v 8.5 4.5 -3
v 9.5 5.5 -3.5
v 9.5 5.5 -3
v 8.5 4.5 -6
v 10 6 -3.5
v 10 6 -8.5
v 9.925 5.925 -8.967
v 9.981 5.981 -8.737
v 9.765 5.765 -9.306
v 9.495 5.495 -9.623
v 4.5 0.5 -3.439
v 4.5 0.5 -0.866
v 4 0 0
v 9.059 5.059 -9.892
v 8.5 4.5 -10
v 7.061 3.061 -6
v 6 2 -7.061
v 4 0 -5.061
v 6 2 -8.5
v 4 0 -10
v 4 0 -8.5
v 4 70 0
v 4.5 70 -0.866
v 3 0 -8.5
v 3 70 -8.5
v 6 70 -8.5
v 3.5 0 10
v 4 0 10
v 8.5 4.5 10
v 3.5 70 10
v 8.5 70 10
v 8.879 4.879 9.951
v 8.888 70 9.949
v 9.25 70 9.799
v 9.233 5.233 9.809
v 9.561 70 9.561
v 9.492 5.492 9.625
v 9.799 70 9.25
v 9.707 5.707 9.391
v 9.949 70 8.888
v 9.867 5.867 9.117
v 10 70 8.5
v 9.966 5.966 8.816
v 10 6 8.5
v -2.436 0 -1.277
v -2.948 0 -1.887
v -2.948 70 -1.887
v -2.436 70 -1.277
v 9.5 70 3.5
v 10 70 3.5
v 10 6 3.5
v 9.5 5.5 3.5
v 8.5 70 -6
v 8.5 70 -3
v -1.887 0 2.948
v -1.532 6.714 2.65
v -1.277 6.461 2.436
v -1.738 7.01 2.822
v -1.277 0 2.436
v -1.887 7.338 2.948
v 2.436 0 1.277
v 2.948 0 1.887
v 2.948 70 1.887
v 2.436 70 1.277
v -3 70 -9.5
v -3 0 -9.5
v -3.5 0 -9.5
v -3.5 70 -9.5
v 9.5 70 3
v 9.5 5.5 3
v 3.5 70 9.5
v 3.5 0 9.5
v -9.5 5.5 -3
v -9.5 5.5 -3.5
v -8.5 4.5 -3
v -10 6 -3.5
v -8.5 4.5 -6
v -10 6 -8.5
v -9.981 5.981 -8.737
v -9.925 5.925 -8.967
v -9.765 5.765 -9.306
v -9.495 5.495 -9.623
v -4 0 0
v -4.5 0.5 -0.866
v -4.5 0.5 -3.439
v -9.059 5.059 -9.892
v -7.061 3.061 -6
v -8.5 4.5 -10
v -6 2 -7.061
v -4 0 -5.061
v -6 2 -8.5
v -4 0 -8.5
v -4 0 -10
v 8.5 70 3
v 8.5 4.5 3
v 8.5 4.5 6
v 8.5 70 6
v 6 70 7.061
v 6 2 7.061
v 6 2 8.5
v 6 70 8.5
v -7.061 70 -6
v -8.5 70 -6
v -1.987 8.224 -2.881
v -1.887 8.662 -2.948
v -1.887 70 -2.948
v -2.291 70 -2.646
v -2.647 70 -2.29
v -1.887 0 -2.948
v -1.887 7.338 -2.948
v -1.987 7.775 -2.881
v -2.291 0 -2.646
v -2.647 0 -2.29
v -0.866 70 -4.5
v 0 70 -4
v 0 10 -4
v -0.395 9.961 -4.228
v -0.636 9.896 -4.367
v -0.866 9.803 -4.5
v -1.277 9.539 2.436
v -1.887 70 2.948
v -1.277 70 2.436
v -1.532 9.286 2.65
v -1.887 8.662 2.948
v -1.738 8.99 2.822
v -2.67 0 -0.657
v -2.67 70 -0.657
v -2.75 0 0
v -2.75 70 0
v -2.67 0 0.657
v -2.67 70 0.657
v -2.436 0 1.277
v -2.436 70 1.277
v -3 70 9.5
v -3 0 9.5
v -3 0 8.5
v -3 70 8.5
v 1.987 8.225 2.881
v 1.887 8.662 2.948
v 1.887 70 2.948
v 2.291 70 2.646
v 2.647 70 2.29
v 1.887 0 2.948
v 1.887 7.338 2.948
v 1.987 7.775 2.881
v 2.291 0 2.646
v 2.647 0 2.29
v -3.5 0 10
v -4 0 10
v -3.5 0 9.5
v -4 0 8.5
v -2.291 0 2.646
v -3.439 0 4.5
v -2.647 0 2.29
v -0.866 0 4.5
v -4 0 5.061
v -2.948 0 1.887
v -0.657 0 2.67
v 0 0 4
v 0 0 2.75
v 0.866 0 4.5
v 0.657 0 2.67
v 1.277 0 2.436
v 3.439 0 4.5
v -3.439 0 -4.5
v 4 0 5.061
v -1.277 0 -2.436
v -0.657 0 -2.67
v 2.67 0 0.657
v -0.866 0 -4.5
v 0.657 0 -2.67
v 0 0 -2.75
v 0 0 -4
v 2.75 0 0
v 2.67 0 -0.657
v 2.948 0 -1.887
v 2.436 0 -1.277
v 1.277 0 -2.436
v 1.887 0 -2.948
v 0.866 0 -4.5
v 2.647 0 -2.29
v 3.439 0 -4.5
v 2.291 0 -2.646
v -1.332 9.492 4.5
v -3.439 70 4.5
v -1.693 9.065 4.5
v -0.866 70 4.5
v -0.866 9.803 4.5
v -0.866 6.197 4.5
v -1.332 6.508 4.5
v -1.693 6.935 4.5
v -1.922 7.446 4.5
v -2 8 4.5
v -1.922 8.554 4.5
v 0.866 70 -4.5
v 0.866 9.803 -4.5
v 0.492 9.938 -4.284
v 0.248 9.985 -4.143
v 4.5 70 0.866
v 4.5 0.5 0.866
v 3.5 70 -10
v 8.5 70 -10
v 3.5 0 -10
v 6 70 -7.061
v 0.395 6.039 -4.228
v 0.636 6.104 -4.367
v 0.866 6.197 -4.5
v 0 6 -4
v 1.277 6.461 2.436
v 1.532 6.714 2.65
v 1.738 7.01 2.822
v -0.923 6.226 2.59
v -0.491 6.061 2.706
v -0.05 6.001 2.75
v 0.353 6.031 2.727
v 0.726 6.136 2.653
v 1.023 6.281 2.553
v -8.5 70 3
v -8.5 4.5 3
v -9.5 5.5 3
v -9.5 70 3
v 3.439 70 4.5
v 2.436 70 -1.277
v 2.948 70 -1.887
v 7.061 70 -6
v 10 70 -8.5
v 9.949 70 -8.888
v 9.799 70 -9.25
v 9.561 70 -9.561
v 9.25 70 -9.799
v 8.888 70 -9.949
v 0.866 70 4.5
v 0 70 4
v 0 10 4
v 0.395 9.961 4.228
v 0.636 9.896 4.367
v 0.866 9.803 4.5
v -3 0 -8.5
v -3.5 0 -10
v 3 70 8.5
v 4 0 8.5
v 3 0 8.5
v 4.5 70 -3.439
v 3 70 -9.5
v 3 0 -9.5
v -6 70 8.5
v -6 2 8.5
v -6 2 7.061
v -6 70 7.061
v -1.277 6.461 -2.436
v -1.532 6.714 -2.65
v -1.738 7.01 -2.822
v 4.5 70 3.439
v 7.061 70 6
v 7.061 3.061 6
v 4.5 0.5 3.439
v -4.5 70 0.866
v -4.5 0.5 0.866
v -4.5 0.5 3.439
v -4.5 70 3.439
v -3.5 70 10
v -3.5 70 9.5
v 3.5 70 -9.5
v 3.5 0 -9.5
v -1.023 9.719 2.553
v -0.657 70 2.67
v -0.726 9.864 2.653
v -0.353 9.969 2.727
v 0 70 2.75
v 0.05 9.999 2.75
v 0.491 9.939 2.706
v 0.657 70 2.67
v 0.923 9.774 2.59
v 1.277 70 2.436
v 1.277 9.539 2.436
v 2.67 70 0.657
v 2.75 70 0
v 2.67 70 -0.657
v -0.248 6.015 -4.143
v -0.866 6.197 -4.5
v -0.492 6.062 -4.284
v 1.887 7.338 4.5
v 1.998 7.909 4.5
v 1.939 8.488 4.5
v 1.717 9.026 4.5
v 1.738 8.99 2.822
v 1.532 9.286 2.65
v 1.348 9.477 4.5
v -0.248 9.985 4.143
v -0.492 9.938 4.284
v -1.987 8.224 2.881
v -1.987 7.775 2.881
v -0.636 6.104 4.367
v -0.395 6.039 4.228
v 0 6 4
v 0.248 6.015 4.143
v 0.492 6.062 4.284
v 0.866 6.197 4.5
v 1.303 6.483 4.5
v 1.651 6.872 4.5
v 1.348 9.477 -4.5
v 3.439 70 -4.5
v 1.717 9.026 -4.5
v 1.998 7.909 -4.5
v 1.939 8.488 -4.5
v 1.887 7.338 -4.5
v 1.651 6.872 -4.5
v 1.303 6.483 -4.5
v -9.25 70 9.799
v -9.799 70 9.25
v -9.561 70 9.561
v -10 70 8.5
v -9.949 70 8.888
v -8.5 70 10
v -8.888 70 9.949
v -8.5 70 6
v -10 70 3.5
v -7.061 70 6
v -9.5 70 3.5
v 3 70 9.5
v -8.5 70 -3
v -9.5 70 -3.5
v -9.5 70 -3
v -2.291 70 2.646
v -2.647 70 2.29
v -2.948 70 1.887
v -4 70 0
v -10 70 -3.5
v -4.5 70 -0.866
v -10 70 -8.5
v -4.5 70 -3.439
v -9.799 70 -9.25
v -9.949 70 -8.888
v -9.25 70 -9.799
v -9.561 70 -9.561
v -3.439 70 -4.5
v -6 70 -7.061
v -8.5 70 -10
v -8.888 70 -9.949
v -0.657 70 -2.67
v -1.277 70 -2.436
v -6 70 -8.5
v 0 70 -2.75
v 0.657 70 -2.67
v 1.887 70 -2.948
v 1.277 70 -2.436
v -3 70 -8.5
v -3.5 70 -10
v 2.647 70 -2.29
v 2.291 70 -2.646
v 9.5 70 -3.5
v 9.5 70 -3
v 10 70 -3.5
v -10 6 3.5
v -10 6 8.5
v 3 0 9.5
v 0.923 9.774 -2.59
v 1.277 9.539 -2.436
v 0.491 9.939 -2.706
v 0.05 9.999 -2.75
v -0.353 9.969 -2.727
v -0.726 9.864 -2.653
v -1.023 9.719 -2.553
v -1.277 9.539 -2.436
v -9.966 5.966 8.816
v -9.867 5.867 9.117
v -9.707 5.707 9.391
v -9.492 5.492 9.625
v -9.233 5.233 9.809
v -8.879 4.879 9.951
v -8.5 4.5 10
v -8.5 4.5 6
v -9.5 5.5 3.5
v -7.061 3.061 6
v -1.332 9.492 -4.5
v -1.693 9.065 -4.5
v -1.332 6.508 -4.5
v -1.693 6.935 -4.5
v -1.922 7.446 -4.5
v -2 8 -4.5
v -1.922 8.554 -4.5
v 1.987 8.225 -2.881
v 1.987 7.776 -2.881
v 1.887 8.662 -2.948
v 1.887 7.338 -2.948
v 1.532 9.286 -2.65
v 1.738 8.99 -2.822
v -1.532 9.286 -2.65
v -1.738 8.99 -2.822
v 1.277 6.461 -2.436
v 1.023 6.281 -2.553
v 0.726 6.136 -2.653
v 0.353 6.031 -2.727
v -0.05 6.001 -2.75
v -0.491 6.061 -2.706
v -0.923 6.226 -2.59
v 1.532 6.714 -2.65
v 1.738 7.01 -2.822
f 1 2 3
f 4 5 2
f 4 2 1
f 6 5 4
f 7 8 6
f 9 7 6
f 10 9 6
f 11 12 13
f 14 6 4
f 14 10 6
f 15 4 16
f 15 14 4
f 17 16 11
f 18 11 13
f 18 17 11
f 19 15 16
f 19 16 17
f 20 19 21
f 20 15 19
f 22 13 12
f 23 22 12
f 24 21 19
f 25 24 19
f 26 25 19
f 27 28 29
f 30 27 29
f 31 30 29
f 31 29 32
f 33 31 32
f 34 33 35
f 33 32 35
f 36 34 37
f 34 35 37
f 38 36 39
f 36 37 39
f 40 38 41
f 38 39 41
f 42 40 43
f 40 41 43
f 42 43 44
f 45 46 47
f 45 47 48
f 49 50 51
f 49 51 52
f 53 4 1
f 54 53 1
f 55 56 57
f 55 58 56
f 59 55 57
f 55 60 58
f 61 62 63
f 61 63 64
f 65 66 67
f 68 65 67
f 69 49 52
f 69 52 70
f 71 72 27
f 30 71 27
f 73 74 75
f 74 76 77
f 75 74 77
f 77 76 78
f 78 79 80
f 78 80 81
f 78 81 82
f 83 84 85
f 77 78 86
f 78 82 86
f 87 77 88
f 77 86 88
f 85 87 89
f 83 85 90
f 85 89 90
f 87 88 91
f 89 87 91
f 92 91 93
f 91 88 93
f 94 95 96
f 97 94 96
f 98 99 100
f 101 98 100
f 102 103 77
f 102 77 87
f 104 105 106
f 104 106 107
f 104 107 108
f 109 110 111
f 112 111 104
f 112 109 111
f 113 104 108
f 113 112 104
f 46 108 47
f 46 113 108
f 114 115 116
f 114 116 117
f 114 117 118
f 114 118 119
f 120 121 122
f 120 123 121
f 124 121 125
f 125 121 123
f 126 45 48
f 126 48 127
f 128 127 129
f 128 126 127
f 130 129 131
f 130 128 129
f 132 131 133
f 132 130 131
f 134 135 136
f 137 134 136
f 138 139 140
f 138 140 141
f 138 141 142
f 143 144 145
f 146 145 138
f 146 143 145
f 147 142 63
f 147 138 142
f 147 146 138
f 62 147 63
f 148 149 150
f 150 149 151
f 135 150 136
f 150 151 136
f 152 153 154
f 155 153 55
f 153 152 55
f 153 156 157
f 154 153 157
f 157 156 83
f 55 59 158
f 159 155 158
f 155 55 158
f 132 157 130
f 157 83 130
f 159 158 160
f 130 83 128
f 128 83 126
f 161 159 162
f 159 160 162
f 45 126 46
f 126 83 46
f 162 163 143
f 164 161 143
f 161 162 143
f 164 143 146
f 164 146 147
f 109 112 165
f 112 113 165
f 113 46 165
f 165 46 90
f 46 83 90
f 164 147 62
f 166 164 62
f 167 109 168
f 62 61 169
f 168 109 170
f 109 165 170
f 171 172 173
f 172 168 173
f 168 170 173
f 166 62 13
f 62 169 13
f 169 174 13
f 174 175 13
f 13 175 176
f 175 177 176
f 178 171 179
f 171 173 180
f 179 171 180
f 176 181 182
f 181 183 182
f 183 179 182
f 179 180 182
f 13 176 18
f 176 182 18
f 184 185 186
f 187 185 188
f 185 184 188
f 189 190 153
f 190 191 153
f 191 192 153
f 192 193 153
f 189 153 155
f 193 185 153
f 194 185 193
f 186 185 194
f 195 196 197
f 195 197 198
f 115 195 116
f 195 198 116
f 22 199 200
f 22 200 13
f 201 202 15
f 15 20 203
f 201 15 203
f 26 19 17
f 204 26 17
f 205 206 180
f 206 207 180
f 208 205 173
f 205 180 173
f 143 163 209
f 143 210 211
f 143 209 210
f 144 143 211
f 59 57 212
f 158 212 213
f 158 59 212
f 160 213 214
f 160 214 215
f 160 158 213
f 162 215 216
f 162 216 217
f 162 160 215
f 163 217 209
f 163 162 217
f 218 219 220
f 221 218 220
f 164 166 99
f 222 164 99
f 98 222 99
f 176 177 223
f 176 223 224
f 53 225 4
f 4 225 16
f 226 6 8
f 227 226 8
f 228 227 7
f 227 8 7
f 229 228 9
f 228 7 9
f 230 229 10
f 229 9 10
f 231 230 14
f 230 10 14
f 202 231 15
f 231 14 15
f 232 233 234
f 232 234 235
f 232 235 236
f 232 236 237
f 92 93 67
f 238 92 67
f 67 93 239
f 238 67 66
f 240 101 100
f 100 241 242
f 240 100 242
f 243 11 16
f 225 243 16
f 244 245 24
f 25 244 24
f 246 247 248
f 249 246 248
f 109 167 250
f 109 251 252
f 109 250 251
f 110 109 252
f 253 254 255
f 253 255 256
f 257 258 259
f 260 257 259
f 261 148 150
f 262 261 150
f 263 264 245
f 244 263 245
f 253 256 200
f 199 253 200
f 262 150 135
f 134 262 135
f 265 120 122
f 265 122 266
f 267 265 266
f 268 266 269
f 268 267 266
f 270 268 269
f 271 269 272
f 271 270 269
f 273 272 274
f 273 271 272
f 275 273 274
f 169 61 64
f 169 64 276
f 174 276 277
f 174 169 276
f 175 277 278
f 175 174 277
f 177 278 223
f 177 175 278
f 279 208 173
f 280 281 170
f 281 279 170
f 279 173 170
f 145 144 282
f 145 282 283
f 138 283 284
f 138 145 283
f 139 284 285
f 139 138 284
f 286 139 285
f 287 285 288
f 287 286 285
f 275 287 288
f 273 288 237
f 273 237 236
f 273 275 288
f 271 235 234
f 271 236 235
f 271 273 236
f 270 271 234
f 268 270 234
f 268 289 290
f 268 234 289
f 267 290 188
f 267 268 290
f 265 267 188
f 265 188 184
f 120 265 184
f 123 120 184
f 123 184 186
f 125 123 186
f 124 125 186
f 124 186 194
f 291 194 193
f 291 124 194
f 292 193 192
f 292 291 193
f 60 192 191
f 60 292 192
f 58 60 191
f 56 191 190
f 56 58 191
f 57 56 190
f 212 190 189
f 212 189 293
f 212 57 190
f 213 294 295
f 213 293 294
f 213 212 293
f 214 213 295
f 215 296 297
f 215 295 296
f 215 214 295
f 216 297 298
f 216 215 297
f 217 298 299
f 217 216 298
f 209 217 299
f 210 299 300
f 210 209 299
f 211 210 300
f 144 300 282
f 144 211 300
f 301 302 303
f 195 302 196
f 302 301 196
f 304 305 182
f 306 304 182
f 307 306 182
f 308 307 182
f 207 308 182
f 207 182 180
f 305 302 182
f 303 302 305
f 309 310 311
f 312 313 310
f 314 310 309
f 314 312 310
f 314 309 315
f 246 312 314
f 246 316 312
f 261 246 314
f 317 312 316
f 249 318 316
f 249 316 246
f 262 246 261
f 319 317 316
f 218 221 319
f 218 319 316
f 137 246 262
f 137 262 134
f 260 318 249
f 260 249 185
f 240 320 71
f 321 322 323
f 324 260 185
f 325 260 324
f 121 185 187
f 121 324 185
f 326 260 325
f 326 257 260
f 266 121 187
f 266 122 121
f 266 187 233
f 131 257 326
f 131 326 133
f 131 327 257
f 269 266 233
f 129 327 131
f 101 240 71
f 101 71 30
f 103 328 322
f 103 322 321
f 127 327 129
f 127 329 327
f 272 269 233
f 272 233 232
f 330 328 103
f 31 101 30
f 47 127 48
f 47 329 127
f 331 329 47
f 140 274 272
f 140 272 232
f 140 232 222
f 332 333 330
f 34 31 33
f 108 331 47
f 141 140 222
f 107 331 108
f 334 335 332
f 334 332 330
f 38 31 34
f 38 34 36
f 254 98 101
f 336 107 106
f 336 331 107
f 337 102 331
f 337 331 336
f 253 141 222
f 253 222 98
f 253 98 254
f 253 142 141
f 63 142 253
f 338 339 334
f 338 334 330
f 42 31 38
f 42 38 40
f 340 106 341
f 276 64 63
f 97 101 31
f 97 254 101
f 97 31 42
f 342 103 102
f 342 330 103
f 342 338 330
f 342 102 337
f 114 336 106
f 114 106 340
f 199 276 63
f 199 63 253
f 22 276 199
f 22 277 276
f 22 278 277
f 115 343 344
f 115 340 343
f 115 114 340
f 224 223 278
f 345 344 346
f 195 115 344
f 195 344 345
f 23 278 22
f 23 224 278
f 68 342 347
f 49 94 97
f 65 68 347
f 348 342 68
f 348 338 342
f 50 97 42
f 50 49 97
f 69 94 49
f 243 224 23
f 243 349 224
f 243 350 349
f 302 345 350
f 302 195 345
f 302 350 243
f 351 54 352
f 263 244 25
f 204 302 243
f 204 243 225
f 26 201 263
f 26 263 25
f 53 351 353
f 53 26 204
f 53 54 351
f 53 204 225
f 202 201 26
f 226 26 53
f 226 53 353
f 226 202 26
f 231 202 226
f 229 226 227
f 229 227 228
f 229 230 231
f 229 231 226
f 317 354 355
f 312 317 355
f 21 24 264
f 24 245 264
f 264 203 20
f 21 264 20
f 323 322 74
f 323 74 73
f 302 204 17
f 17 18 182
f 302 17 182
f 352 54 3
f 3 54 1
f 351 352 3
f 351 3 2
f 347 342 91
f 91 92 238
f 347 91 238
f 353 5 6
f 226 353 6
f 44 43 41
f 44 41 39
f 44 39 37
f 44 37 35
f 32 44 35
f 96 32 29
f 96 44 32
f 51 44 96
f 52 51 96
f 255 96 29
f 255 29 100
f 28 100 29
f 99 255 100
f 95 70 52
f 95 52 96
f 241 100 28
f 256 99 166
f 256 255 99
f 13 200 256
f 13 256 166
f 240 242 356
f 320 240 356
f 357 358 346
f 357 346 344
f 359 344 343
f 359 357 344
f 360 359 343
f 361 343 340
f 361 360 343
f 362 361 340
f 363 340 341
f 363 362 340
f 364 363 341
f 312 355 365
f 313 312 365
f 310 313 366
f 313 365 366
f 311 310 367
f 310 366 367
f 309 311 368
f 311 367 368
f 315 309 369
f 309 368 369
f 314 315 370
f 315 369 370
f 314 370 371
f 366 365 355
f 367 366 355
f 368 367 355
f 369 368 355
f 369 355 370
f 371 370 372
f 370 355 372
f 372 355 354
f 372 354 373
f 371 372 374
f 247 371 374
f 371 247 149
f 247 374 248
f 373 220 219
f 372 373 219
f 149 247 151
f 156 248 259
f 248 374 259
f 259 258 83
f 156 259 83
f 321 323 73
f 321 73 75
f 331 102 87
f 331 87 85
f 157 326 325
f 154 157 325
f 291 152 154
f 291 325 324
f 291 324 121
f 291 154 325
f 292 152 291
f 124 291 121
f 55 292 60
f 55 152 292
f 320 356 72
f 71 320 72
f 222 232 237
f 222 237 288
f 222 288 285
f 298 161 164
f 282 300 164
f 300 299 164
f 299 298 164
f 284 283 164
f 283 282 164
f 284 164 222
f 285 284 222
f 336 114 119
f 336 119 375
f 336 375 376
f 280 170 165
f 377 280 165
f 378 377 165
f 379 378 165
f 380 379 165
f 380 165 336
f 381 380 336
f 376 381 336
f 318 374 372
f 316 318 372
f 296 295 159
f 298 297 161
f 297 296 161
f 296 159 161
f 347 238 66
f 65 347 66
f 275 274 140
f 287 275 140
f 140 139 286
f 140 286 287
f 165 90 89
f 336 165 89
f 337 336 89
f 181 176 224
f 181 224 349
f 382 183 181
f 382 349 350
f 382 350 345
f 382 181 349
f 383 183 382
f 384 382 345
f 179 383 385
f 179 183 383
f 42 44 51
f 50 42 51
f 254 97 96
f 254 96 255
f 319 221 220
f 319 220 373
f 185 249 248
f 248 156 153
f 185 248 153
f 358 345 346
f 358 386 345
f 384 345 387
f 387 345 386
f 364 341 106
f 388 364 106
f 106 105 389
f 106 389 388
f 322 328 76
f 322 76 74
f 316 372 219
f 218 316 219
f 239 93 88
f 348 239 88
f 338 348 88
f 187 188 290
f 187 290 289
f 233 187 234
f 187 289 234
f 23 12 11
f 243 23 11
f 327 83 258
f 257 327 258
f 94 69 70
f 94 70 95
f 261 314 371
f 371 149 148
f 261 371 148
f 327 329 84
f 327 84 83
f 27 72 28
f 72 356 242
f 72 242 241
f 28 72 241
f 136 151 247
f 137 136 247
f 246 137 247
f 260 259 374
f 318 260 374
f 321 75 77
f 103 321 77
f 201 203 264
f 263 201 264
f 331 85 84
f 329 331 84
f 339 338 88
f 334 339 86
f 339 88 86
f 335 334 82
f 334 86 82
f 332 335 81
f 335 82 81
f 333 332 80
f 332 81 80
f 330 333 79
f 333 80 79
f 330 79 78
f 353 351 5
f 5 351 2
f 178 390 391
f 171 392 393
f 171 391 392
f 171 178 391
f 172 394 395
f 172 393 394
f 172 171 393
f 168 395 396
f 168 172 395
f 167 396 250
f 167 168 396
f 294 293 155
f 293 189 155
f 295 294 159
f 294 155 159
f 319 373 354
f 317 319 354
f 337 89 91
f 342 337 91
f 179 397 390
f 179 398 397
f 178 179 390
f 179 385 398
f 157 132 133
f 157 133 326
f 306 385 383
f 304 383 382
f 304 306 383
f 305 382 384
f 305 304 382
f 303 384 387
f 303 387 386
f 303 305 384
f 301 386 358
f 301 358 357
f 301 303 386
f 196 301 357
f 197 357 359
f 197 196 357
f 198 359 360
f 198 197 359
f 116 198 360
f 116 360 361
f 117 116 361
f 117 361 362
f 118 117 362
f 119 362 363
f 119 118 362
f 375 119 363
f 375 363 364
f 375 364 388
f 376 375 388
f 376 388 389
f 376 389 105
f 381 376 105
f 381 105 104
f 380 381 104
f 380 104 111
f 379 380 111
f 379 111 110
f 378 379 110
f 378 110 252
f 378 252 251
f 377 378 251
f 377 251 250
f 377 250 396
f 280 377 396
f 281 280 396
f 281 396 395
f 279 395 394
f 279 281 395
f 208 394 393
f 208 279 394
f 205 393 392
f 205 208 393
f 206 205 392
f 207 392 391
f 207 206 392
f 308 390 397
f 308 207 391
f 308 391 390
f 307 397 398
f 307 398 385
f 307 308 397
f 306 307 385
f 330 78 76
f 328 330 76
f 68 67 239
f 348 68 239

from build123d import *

# Parameters (mm, degrees)
BOSS_EXTRUDE1_DEPTH     = 70
CUT_EXTRUDE1_DEPTH      = 72.414284285
CUT_EXTRUDE1_DEPTH_BACK = 72.414284285
SKETCH3_R               = 2


# Read off the part's stored shape, not the designer's step: Imported1
with BuildPart() as part:
    # Sketch1 → Boss-Extrude1 (new body)
    with BuildSketch(Plane(origin=(0, 0, 0), x_dir=(1, 0, 0), z_dir=(0, 1, 0))):
        with BuildLine():
            Line((4.5, -0.866025), (4, 0))
            Line((4, 0), (4.5, 0.866025))
            Line((4.5, 0.866025), (4.5, 3.43934))
            Line((4.5, 3.43934), (7.06066, 6))
            Line((7.06066, 6), (8.5, 6))
            Line((8.5, 6), (8.5, 3))
            Line((8.5, 3), (9.5, 3))
            Line((9.5, 3), (9.5, 3.5))
            Line((9.5, 3.5), (10, 3.5))
            Line((10, 3.5), (10, 8.5))
            ThreePointArc((10, 8.5), (9.560660172, 9.560660172), (8.5, 10))
            Line((8.5, 10), (3.5, 10))
            Line((3.5, 10), (3.5, 9.5))
            Line((3.5, 9.5), (3, 9.5))
            Line((3, 9.5), (3, 8.5))
            Line((3, 8.5), (6, 8.5))
            Line((6, 8.5), (6, 7.06066))
            Line((6, 7.06066), (3.43934, 4.5))
            Line((3.43934, 4.5), (0.866025, 4.5))
            Line((0.866025, 4.5), (0, 4))
            Line((0, 4), (-0.866025, 4.5))
            Line((-0.866025, 4.5), (-3.43934, 4.5))
            Line((-3.43934, 4.5), (-6, 7.06066))
            Line((-6, 7.06066), (-6, 8.5))
            Line((-6, 8.5), (-3, 8.5))
            Line((-3, 8.5), (-3, 9.5))
            Line((-3, 9.5), (-3.5, 9.5))
            Line((-3.5, 9.5), (-3.5, 10))
            Line((-3.5, 10), (-8.5, 10))
            ThreePointArc((-8.5, 10), (-9.560660172, 9.560660172), (-10, 8.5))
            Line((-10, 8.5), (-10, 3.5))
            Line((-10, 3.5), (-9.5, 3.5))
            Line((-9.5, 3.5), (-9.5, 3))
            Line((-9.5, 3), (-8.5, 3))
            Line((-8.5, 3), (-8.5, 6))
            Line((-8.5, 6), (-7.06066, 6))
            Line((-7.06066, 6), (-4.5, 3.43934))
            Line((-4.5, 3.43934), (-4.5, 0.866025))
            Line((-4.5, 0.866025), (-4, 0))
            Line((-4, 0), (-4.5, -0.866025))
            Line((-4.5, -0.866025), (-4.5, -3.43934))
            Line((-4.5, -3.43934), (-7.06066, -6))
            Line((-7.06066, -6), (-8.5, -6))
            Line((-8.5, -6), (-8.5, -3))
            Line((-8.5, -3), (-9.5, -3))
            Line((-9.5, -3), (-9.5, -3.5))
            Line((-9.5, -3.5), (-10, -3.5))
            Line((-10, -3.5), (-10, -8.5))
            ThreePointArc((-10, -8.5), (-9.560660172, -9.560660172), (-8.5, -10))
            Line((-8.5, -10), (-3.5, -10))
            Line((-3.5, -10), (-3.5, -9.5))
            Line((-3.5, -9.5), (-3, -9.5))
            Line((-3, -9.5), (-3, -8.5))
            Line((-3, -8.5), (-6, -8.5))
            Line((-6, -8.5), (-6, -7.06066))
            Line((-6, -7.06066), (-3.43934, -4.5))
            Line((-3.43934, -4.5), (-0.866025, -4.5))
            Line((-0.866025, -4.5), (0, -4))
            Line((0, -4), (0.866025, -4.5))
            Line((0.866025, -4.5), (3.43934, -4.5))
            Line((3.43934, -4.5), (6, -7.06066))
            Line((6, -7.06066), (6, -8.5))
            Line((6, -8.5), (3, -8.5))
            Line((3, -8.5), (3, -9.5))
            Line((3, -9.5), (3.5, -9.5))
            Line((3.5, -9.5), (3.5, -10))
            Line((3.5, -10), (8.5, -10))
            ThreePointArc((8.5, -10), (9.560660172, -9.560660172), (10, -8.5))
            Line((10, -8.5), (10, -3.5))
            Line((10, -3.5), (9.5, -3.5))
            Line((9.5, -3.5), (9.5, -3))
            Line((9.5, -3), (8.5, -3))
            Line((8.5, -3), (8.5, -6))
            Line((8.5, -6), (7.06066, -6))
            Line((7.06066, -6), (4.5, -3.43934))
            Line((4.5, -3.43934), (4.5, -0.866025))
        make_face()
        with BuildLine():
            Line((2.947757456, -1.8869899), (2.435674593, -1.276711693))
            ThreePointArc((2.435674593, -1.276711693), (2.750000433, -2.31e-07), (2.435674303, 1.276711159))
            Line((2.435674303, 1.276711159), (2.947757255, 1.886989128))
            ThreePointArc((2.947757255, 1.886989128), (2.474929059, 2.474818349), (1.887120795, 2.947672597))
            Line((1.887120795, 2.947672597), (1.276854759, 2.435598541))
            ThreePointArc((1.276854759, 2.435598541), (-1.33e-07, 2.749999412), (-1.276854885, 2.435597973))
            Line((-1.276854885, 2.435597973), (-1.887121068, 2.94767181))
            ThreePointArc((-1.887121068, 2.94767181), (-2.47492916, 2.474817292), (-2.947757123, 1.886987839))
            Line((-2.947757123, 1.886987839), (-2.43567406, 1.276709798))
            ThreePointArc((-2.43567406, 1.276709798), (-2.749999477, -6.08e-07), (-2.435674, -1.276711))
            Line((-2.435674, -1.276711), (-2.947757054, -1.886989034))
            ThreePointArc((-2.947757054, -1.886989034), (-2.474929075, -2.474818464), (-1.887120973, -2.947672958))
            Line((-1.887120973, -2.947672958), (-1.276855, -2.435599))
            ThreePointArc((-1.276855, -2.435599), (-1.15e-07, -2.750000499), (1.276854906, -2.43559955))
            Line((1.276854906, -2.43559955), (1.887120935, -2.947673594))
            ThreePointArc((1.887120935, -2.947673594), (2.47492925, -2.474819245), (2.947757456, -1.8869899))
        make_face(mode=Mode.SUBTRACT)
    extrude(amount=BOSS_EXTRUDE1_DEPTH)

    # Sketch3 → Cut-Extrude1 (cut, two sides: drawn at the far end of the back side and taken through both)
    with BuildSketch(Plane.XY.offset(-CUT_EXTRUDE1_DEPTH_BACK)):
        with Locations(Location((0, 8, 0), (0, 0, 340.658342389))):
            Circle(SKETCH3_R)
        Polygon((-10, 6), (-4, 0), (-10, 0), align=None)
        Polygon((10, 0), (10, 6), (4, 0), align=None)
    extrude(amount=CUT_EXTRUDE1_DEPTH + CUT_EXTRUDE1_DEPTH_BACK, mode=Mode.SUBTRACT)


solid = part.part
